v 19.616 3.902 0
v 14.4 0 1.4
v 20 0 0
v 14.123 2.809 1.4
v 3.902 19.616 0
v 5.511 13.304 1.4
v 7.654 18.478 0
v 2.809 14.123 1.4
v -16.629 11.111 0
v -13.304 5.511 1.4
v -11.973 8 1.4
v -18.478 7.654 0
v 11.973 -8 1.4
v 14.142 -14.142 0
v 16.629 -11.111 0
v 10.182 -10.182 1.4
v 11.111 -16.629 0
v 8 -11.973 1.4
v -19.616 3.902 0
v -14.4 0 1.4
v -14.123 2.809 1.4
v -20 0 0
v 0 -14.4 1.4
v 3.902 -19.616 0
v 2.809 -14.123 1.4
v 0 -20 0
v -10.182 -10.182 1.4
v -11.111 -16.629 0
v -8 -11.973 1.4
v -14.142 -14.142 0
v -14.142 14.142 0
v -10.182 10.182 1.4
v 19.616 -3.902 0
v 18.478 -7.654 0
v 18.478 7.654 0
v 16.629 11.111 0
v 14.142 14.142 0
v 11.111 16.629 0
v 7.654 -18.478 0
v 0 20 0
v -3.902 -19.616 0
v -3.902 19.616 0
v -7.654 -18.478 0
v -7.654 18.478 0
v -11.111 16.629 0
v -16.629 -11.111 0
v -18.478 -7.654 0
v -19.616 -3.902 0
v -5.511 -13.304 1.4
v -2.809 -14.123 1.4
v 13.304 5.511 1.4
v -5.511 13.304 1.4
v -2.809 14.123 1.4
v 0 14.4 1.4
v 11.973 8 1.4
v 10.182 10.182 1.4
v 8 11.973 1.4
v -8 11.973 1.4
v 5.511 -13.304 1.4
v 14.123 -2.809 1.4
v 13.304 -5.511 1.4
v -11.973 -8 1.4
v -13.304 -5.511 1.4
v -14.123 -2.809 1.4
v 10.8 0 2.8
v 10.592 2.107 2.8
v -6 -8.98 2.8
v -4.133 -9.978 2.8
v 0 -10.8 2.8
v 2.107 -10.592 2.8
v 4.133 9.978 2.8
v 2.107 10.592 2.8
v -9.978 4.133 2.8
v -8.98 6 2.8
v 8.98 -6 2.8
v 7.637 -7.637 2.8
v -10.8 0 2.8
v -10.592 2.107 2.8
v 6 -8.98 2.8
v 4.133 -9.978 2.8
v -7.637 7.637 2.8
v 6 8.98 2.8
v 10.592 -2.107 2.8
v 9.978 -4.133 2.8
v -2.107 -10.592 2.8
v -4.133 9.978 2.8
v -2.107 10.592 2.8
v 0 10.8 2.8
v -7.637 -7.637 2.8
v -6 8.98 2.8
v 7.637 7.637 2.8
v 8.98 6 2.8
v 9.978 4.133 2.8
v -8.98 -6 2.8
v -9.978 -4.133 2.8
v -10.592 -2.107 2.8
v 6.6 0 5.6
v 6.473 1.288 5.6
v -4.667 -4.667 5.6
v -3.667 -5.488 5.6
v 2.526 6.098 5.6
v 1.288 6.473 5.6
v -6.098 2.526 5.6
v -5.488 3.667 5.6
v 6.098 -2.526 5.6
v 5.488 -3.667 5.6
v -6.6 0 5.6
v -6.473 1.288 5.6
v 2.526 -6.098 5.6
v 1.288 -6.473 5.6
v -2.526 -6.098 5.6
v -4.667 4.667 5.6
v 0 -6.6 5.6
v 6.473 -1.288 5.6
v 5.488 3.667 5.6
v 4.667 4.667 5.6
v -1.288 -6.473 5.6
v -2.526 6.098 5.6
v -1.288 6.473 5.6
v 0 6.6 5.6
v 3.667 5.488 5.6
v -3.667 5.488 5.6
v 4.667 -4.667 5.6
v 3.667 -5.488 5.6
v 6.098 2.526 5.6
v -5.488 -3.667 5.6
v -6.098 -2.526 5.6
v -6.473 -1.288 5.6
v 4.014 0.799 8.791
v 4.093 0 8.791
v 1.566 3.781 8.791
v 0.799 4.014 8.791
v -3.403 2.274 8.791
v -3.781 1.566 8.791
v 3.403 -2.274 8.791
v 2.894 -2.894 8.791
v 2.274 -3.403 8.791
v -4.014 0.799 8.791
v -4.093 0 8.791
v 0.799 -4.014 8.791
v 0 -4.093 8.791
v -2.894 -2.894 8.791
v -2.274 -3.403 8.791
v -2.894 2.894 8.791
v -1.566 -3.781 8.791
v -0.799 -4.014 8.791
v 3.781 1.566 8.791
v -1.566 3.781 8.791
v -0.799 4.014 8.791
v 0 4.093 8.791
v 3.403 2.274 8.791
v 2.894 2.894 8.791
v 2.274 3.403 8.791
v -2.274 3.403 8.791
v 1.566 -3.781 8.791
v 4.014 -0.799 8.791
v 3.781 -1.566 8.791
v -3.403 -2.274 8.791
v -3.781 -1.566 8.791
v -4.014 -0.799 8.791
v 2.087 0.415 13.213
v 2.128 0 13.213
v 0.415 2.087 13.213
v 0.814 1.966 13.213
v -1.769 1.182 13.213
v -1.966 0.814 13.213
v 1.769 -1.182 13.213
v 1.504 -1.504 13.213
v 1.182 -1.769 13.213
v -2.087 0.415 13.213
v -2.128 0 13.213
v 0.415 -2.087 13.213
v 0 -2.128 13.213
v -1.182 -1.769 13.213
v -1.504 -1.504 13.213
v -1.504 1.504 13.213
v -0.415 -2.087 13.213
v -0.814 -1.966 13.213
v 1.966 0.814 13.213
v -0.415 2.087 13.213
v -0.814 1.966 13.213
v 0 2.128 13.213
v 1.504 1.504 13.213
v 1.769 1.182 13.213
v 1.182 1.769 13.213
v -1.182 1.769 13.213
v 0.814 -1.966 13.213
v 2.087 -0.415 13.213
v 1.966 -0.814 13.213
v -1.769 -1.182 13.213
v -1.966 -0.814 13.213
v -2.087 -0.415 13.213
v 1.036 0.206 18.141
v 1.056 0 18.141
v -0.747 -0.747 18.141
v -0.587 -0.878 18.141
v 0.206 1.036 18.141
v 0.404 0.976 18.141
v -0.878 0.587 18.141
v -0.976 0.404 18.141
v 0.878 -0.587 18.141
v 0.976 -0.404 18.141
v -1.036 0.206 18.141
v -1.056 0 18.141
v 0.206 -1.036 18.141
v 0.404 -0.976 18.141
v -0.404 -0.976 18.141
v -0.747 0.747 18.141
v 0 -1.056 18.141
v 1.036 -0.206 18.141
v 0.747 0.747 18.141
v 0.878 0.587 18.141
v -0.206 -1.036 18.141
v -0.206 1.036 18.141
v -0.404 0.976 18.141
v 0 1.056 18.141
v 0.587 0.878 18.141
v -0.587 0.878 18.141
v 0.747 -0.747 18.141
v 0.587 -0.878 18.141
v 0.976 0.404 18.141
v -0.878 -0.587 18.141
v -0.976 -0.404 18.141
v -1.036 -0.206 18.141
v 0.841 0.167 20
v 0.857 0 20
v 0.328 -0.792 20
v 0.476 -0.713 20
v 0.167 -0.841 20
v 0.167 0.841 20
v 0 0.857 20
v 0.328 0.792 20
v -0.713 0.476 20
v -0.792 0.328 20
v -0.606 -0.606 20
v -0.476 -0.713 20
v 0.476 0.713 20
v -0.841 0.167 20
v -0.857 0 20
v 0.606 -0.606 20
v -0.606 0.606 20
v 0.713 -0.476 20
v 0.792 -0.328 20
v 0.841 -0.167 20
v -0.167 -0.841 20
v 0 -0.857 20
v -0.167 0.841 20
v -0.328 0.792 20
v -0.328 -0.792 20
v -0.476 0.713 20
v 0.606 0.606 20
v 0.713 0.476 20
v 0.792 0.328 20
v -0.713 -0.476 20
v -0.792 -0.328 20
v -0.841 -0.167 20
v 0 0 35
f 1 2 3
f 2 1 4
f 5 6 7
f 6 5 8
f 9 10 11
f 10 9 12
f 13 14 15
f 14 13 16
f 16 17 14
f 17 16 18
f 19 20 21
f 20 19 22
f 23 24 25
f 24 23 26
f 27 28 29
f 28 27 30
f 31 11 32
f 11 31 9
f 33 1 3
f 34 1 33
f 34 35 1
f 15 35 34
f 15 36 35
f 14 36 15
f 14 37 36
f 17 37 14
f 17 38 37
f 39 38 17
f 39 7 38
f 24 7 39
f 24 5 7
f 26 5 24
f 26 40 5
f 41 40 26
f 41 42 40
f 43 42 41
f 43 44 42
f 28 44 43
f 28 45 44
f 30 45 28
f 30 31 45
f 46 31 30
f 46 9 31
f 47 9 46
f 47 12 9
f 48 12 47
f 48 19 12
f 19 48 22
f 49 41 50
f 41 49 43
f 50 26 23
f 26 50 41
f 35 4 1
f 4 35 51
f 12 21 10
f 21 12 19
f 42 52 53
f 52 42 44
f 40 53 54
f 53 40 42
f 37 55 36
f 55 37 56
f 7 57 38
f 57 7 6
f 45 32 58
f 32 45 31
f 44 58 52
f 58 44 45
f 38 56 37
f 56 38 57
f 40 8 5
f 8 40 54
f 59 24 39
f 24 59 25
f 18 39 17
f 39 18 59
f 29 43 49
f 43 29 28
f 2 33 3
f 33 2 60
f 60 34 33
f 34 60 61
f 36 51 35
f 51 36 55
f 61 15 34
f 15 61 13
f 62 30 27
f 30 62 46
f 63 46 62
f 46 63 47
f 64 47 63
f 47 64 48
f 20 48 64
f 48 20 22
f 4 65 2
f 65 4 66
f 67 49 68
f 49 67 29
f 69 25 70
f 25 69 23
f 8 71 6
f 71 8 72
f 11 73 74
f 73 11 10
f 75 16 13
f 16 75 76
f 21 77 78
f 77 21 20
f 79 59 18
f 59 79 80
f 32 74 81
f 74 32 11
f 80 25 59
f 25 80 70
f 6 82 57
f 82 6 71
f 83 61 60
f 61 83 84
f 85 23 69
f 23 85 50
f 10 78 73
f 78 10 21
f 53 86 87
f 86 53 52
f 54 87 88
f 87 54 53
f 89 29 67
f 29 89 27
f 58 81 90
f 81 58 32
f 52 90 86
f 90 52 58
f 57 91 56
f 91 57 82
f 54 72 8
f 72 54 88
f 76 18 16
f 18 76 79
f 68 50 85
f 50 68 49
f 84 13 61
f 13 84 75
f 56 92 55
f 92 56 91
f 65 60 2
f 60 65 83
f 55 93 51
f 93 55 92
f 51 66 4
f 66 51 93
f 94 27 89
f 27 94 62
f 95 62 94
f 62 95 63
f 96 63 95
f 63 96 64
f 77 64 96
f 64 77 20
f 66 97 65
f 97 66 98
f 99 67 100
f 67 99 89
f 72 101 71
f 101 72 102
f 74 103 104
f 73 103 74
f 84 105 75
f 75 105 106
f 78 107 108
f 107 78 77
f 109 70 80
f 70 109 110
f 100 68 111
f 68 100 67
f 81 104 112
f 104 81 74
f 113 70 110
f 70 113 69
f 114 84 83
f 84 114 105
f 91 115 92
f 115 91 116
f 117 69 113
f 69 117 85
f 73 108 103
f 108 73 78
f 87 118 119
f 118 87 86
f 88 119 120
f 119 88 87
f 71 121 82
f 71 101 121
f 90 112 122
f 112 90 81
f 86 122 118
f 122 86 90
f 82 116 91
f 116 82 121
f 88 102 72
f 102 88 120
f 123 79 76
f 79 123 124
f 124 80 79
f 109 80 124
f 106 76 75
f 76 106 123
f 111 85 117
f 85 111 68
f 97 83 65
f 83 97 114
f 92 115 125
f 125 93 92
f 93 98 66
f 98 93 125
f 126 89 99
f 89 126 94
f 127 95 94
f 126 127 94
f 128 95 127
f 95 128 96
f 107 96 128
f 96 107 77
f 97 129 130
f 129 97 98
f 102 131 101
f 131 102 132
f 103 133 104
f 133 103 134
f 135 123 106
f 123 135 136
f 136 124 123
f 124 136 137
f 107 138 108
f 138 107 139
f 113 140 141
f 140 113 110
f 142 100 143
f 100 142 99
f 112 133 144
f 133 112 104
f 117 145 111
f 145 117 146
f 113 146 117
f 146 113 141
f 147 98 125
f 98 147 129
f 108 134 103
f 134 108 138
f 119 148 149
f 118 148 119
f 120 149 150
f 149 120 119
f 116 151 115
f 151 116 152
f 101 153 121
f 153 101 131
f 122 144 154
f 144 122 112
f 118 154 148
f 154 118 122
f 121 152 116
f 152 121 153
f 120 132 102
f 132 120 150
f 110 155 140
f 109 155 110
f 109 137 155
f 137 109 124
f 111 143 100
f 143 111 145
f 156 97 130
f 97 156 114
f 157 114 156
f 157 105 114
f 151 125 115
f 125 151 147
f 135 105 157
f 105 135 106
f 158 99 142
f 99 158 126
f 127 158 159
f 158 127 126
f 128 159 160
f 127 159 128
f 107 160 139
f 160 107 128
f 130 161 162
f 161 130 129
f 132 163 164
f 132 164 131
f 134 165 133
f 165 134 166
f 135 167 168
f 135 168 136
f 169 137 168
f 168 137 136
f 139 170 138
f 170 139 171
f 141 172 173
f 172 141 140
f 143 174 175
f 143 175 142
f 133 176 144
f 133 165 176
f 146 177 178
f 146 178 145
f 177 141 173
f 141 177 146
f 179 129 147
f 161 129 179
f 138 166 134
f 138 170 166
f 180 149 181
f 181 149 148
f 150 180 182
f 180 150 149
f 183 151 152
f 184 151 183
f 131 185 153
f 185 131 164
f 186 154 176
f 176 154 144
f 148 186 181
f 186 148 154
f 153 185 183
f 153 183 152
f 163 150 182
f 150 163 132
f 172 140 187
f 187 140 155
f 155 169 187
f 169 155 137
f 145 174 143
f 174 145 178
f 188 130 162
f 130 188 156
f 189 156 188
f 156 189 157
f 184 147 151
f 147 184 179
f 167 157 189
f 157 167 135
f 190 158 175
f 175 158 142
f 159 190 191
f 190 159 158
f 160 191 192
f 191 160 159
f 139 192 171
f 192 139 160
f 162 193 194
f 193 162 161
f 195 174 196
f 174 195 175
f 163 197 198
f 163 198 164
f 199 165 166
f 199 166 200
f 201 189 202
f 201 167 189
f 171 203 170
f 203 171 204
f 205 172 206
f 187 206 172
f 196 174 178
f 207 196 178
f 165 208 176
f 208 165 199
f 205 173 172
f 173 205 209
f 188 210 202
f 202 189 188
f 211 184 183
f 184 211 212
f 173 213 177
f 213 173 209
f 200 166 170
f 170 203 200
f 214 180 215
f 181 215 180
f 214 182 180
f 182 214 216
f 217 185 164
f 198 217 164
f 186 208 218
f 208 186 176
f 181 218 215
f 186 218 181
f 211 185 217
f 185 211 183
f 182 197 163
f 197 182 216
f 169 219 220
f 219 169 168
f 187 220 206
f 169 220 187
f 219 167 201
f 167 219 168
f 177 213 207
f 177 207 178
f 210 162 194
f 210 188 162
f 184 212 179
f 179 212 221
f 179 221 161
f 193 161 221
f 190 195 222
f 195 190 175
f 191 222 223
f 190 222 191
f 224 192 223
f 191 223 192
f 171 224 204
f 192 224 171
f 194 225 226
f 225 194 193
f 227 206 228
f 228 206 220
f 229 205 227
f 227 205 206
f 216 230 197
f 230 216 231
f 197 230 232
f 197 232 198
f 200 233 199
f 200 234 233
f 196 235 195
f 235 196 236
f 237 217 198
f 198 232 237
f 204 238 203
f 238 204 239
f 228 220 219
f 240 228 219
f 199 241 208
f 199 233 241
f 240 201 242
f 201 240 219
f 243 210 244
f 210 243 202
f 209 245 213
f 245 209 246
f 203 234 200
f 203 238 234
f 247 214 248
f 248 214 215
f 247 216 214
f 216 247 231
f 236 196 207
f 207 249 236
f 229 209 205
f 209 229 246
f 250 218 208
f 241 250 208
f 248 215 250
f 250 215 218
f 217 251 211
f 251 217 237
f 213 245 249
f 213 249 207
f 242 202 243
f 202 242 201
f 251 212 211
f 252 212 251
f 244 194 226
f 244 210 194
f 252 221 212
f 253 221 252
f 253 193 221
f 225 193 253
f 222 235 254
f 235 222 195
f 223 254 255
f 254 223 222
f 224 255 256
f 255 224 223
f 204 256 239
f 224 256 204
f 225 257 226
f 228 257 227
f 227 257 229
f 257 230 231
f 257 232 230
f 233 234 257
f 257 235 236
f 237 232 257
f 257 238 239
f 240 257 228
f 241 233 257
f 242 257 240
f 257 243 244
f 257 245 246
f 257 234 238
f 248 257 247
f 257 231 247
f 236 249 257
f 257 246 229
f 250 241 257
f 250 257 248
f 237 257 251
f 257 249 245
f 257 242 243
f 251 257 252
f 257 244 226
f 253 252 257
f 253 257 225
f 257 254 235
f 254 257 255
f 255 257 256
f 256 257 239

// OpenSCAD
module cone(height, radius)
{
   /*  difference() { */
        cylinder(h = height, r1 = radius, r2 = 0, center = false);
        /* translate(v = [0, 0, -2])
            cylinder(h = height, r1 = radius, r2 = 0, center = false);
    } */
}

$fn=32;
union() {
    cone(5,  20);
    cone(7,  18);
    cone(10,  15);
    cone(14,  11);
    cone(18,  8);
    cone(23,  5);
    cone(28,  3);
    cone(35,  2);
}
